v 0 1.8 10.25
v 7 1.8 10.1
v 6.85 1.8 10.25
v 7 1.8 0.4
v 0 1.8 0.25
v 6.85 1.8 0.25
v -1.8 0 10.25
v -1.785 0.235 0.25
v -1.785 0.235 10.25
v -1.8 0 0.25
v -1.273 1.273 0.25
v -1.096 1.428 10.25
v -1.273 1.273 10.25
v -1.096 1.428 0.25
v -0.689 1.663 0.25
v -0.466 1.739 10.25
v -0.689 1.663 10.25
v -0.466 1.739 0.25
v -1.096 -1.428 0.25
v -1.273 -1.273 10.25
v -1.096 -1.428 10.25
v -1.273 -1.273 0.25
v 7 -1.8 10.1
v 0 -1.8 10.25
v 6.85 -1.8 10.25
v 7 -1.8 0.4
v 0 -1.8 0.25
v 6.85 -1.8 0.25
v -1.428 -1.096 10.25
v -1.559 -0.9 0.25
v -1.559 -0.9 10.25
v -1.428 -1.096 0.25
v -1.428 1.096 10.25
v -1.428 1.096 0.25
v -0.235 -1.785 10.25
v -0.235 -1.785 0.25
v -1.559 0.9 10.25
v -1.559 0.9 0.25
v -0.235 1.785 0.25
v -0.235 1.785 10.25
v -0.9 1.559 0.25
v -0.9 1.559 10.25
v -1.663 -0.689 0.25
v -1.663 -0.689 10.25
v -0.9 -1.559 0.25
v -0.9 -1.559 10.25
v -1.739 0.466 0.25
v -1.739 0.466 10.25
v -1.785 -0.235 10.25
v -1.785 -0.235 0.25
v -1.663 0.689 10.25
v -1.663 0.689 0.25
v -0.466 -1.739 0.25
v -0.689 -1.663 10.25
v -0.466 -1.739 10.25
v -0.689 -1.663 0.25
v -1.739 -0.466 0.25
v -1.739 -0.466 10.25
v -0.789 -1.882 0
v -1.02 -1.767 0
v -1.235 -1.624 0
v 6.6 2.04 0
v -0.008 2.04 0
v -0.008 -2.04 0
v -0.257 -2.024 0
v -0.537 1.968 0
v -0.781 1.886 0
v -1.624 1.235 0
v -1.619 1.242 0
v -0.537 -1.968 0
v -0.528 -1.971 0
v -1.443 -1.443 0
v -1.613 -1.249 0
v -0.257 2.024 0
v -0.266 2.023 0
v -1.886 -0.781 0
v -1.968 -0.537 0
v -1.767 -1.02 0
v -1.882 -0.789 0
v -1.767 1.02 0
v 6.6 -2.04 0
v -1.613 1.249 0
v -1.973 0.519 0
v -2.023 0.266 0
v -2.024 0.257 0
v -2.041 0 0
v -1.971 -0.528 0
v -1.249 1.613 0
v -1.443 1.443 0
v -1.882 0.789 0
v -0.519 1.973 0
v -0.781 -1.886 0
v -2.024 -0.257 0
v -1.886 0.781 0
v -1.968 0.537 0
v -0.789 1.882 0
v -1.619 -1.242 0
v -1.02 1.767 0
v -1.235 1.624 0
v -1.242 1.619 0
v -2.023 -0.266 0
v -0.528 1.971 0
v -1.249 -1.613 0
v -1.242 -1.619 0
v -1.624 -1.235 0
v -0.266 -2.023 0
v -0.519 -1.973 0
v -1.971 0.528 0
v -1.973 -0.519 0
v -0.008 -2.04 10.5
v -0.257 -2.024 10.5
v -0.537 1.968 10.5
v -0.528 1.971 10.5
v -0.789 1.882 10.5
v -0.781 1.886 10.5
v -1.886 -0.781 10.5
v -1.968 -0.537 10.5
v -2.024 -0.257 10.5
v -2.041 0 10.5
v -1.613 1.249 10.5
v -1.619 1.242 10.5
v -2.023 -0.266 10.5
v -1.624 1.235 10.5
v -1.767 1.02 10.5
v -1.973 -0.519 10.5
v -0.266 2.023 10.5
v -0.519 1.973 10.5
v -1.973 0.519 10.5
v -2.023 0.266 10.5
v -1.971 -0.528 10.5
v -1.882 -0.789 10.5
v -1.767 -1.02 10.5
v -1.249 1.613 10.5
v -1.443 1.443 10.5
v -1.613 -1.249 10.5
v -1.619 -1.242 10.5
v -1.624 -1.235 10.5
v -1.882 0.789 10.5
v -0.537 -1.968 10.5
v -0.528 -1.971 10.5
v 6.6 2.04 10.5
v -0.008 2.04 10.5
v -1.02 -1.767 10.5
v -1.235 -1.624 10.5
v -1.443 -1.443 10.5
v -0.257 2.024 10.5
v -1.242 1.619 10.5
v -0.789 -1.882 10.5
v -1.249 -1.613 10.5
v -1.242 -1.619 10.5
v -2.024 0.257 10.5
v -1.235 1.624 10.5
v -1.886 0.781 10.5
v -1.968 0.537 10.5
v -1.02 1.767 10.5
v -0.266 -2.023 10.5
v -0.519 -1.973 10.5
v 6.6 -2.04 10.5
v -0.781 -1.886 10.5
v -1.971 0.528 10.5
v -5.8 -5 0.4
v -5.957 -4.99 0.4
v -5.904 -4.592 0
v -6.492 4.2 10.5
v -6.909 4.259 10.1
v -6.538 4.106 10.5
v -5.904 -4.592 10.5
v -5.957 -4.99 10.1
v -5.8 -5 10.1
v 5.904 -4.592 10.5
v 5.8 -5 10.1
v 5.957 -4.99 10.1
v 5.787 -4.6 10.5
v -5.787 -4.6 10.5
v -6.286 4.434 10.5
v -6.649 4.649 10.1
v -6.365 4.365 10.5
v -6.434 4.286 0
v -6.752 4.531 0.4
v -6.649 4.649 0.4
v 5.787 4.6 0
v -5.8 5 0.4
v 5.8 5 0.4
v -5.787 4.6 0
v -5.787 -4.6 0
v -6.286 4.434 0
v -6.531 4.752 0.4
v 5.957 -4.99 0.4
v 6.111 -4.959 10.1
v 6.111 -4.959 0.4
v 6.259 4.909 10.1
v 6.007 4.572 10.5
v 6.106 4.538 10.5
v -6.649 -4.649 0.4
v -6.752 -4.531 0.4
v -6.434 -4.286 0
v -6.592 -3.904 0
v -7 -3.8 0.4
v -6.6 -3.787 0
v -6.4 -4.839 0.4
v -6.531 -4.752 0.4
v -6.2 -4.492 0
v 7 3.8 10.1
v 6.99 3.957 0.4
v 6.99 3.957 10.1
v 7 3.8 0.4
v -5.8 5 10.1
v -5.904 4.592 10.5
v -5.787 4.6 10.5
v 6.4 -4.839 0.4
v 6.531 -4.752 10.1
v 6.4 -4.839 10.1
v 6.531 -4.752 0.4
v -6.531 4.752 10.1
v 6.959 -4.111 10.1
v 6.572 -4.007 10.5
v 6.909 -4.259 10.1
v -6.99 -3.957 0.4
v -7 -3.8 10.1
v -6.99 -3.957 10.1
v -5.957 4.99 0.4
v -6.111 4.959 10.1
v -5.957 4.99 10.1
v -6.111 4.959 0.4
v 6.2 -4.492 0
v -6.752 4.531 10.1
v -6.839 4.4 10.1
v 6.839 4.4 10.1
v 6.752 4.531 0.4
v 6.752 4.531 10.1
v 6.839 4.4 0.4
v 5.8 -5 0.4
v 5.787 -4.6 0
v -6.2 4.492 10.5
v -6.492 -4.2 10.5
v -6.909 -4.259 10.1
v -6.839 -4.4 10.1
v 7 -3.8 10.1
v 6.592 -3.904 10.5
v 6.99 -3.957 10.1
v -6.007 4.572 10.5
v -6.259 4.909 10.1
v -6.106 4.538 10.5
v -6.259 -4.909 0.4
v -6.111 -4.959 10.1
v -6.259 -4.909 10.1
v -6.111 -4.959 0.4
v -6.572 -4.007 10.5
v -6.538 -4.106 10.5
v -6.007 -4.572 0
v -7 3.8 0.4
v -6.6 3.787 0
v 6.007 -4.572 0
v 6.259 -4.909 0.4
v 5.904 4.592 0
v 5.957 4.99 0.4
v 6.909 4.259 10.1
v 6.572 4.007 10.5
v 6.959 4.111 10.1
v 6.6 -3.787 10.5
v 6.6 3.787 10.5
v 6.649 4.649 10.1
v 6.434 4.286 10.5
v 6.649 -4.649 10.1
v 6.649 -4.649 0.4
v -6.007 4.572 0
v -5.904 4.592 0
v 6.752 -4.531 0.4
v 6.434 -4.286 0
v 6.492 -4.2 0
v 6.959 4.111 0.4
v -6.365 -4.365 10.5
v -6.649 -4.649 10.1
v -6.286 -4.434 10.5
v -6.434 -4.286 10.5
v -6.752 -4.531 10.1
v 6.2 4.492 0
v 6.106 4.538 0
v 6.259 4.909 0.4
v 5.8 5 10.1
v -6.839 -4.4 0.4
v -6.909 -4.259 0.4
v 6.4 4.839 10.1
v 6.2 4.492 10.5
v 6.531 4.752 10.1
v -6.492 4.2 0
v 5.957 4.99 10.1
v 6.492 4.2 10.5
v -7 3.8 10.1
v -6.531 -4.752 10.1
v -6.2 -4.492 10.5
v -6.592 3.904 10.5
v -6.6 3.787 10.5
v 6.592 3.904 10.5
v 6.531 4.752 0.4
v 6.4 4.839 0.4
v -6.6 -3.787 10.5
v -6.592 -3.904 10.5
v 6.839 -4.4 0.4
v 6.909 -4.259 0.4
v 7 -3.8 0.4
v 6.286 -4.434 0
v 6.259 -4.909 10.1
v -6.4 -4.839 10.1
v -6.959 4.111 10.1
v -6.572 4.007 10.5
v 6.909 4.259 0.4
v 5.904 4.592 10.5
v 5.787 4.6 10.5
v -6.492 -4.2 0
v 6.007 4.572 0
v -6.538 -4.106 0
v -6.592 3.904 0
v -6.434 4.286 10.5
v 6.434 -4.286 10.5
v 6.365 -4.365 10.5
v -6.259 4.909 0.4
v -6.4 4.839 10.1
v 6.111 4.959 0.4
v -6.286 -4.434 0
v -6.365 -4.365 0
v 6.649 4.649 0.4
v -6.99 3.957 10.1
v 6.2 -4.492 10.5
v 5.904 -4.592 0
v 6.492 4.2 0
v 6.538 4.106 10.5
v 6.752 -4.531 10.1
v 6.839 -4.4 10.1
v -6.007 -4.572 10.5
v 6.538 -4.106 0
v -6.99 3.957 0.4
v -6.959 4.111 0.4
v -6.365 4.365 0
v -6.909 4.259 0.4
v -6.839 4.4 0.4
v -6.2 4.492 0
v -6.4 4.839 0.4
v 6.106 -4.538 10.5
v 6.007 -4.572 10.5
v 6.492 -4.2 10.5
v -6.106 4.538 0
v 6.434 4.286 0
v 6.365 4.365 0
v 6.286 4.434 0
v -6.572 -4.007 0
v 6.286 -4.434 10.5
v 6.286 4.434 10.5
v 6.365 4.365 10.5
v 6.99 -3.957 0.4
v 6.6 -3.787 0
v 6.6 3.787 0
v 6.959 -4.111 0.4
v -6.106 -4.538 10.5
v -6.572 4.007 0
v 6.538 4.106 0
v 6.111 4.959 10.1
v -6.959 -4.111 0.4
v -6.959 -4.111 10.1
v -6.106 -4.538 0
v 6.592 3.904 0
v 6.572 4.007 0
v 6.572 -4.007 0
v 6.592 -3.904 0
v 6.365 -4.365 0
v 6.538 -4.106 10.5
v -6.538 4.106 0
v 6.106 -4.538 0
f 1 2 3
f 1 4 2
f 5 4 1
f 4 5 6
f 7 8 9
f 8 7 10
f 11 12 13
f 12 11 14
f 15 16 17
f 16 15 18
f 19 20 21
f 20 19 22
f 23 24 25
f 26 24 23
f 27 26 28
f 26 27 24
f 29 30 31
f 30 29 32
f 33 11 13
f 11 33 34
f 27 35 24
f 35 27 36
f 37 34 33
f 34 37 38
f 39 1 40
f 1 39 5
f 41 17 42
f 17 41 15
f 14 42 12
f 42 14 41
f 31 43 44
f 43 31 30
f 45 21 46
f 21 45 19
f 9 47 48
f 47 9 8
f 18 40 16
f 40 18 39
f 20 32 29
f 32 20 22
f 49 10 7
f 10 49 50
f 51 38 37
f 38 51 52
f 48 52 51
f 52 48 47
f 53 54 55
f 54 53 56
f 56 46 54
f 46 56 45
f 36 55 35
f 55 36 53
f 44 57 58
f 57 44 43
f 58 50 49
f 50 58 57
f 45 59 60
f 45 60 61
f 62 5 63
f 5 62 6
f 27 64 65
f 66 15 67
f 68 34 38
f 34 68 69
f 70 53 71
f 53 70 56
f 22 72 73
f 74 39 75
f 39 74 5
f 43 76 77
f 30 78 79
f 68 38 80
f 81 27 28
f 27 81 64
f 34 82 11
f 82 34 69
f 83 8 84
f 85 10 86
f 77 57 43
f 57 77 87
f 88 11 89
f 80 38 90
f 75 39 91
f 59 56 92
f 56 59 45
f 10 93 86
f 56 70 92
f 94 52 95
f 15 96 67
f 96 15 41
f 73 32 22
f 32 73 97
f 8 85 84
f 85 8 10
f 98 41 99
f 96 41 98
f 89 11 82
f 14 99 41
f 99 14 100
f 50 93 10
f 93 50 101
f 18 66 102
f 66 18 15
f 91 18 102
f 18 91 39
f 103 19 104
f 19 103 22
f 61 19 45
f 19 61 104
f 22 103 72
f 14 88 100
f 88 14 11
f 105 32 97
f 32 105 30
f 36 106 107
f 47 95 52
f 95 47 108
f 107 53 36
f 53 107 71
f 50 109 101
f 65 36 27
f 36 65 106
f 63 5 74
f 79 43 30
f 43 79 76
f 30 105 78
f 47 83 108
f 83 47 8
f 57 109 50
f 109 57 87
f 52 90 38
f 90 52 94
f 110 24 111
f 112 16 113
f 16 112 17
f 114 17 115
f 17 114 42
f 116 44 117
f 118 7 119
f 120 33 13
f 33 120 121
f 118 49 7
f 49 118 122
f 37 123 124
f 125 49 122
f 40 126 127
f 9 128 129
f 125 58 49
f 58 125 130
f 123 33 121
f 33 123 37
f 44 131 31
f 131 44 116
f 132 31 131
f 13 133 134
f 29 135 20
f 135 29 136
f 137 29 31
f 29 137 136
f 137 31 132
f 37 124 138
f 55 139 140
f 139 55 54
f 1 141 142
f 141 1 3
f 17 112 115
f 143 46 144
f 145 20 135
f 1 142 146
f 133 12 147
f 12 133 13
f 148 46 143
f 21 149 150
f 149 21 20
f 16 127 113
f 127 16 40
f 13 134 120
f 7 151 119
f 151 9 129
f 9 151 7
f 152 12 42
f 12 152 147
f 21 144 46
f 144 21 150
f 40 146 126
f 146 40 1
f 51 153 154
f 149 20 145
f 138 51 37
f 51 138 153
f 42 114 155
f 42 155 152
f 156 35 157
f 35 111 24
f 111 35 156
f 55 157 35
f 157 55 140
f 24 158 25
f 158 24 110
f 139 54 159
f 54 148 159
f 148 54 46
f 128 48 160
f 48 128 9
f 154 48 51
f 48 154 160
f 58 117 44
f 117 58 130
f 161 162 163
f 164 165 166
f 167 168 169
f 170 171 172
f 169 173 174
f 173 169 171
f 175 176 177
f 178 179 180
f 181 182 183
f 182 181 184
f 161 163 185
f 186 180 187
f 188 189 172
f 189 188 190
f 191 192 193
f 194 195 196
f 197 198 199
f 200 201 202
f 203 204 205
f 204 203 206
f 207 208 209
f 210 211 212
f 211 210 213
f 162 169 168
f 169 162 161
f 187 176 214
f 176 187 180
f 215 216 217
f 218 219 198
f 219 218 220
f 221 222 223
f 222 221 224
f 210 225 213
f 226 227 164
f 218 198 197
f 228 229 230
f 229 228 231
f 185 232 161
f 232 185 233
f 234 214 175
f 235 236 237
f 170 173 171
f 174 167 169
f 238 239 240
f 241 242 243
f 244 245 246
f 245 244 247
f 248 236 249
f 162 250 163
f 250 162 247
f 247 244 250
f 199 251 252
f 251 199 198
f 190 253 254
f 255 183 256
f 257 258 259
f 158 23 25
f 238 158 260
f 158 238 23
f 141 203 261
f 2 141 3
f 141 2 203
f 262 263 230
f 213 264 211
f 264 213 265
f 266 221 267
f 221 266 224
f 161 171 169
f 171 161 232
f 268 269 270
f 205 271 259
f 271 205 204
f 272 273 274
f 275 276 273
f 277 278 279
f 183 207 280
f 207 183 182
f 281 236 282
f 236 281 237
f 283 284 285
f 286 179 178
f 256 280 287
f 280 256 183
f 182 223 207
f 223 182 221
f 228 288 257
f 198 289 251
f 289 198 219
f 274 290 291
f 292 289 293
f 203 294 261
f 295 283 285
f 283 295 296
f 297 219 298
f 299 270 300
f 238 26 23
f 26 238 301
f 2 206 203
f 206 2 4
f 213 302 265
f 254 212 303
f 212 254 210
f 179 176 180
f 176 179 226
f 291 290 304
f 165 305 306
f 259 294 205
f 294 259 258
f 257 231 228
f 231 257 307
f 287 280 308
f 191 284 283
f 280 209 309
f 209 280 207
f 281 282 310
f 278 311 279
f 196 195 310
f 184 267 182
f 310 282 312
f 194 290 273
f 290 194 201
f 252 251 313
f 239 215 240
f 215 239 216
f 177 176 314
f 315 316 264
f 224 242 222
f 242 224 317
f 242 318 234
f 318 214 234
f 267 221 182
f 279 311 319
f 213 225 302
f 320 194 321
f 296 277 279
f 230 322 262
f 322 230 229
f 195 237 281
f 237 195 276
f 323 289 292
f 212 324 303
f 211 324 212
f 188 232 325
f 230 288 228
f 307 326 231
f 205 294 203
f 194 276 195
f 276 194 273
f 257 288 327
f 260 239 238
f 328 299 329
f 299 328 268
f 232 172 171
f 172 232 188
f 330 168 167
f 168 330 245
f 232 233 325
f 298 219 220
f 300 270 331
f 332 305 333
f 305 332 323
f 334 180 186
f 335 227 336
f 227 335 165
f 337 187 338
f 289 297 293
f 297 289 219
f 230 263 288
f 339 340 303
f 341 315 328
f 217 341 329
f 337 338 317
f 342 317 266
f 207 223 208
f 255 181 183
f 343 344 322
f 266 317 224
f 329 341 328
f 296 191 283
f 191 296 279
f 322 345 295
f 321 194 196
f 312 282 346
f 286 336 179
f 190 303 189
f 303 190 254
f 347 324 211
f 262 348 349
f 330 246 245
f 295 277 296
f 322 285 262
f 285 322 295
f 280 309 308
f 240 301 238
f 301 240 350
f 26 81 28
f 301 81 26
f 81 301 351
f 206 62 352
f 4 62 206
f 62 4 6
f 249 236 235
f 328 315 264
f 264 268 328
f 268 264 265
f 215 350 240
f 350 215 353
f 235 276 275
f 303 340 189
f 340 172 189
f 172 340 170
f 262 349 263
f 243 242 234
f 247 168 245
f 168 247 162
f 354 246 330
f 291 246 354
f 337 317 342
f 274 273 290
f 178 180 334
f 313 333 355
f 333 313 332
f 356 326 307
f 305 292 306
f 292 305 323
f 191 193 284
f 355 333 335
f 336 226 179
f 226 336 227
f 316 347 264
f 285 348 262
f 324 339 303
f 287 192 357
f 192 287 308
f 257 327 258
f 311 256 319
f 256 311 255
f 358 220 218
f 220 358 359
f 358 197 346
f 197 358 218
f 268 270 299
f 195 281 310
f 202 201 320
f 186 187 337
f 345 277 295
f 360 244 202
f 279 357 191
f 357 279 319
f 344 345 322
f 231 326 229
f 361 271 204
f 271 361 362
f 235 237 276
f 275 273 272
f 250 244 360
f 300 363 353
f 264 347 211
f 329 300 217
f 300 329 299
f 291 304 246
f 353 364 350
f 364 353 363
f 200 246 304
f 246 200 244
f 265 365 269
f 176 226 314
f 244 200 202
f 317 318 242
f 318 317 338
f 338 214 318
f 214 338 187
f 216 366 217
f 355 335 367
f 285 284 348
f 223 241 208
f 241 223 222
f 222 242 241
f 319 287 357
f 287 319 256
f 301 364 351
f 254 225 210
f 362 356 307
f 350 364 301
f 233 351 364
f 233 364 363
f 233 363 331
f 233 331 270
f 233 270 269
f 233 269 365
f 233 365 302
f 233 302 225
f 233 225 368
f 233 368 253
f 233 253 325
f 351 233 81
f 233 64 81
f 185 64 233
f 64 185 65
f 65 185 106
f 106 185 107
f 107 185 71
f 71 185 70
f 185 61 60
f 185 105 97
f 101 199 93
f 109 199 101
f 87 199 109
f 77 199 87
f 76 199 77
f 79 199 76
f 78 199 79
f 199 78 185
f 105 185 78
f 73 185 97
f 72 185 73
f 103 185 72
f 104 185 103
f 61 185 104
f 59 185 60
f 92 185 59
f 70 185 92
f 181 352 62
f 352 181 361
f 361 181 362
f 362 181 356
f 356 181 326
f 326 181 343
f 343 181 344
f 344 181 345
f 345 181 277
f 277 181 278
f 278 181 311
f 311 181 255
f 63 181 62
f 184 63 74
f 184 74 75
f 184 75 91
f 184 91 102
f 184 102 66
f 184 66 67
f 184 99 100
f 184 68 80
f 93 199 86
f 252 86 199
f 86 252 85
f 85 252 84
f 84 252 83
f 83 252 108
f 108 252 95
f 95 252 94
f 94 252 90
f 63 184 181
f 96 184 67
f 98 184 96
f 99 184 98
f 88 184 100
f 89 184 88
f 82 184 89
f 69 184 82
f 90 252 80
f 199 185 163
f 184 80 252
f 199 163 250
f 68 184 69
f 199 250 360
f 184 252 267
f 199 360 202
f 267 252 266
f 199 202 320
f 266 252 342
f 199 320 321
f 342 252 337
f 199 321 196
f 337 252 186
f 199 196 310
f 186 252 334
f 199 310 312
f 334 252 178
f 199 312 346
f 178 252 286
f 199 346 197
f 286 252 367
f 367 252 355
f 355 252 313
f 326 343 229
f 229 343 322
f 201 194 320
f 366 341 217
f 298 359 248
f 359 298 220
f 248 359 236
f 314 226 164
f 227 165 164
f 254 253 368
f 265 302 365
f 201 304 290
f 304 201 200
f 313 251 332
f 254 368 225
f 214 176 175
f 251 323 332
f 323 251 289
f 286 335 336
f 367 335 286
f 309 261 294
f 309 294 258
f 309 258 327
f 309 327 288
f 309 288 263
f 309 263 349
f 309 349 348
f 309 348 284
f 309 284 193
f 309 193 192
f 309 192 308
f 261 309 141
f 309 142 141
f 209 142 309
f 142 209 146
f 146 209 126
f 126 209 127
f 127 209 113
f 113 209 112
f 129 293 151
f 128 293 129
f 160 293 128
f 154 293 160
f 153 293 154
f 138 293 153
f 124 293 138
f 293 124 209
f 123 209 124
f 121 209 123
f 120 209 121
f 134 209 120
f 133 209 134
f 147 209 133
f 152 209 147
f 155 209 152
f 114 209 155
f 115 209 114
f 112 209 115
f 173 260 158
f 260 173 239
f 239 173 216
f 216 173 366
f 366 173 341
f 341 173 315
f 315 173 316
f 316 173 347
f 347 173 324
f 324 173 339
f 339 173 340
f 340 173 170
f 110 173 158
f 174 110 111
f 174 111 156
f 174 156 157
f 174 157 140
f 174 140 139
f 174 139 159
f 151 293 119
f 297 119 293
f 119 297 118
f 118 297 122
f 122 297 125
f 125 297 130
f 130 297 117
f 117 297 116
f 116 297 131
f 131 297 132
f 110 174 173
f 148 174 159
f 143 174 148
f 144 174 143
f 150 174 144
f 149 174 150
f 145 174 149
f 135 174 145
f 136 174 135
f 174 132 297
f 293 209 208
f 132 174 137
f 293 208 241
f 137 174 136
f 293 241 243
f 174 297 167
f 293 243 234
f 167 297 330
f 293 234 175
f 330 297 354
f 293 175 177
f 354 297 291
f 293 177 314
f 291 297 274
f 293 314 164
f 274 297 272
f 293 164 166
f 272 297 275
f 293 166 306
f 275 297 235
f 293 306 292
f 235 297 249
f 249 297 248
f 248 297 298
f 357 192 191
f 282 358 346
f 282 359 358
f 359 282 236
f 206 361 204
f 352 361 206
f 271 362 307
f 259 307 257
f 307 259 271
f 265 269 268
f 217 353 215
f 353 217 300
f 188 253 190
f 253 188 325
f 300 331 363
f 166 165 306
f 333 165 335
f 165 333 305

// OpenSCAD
// file: ../../../../../scad/lib/edge_finished_profiles.scad
// Local positive primitives are finished before functional cuts.
use <util.scad>
module ef_round_rect(w,l,r) {
    safe_r=min(r,w/2-0.01,l/2-0.01);
    translate([-w/2,-l/2]) projection(cut=true) rrect_prism(w,l,1,safe_r);
}
module ef_capsule(w,l) {
    assert(l>=w && w>0);
    hull() for(s=[-1,1]) translate([0,s*(l-w)/2]) circle(d=w,$fn=48);
}
module ef_profile(t,c=0.6) {
    // Compensated local profile, exact extrema and thickness. This is not a
    // blanket Minkowski of a completed part or assembly. Cuts are restored last.
    assert(t>2*c && c>0);
    minkowski() {
        translate([0,0,c]) linear_extrude(t-2*c) offset(delta=-c) children();
        union() {
            translate([0,0,-c]) cylinder(r1=0,r2=c,h=c,$fn=16);
            cylinder(r1=c,r2=0,h=c,$fn=16);
        }
    }
}
module ef_convex_profile(t,c=0.6) {
    // Exact offset loft for convex profiles: avoids unnecessary 3D Minkowski
    // triangulation on large plates and bosses. Nonconvex profiles use ef_profile.
    assert(t>2*c && c>0);
    hull() {
        linear_extrude(0.01) offset(delta=-c) children();
        translate([0,0,c]) linear_extrude(t-2*c) children();
        translate([0,0,t-0.01]) linear_extrude(0.01) offset(delta=-c) children();
    }
}
module ef_cut(t,c=0.6) {
    translate([0,0,-0.1]) linear_extrude(t+0.2) children();
    hull() {
        translate([0,0,-0.01]) linear_extrude(0.01) offset(delta=c) children();
        translate([0,0,c]) linear_extrude(0.01) children();
    }
    hull() {
        translate([0,0,t-c-0.01]) linear_extrude(0.01) children();
        translate([0,0,t]) linear_extrude(0.01) offset(delta=c) children();
    }
}
module ef_bore(d,t,c=0.3) { ef_cut(t,c) circle(d=d,$fn=32); }
// Diameter is the inscribed circle: polygon flats preserve the shaft clearance.
module ef_poly_bore(d,t,c=0.3,sides=8) {
    assert(sides>=6 && sides==floor(sides));
    ef_cut(t,c) rotate(180/sides) circle(r=d/2/cos(180/sides),$fn=sides);
}
module ef_box(w,l,t,r=2,c=0.6) { ef_convex_profile(t,c) ef_round_rect(w,l,r); }
module ef_hex(af) { rotate(30) circle(d=af/cos(30),$fn=6); }
module ef_plan_finish(r=2) {
    // Closing rounds concave roots; opening rounds convex corners. Exact planar
    // extrema and straight functional flats are retained.
    offset(r=r) offset(delta=-r) offset(delta=-r) offset(r=r) children();
}
module ef_root(w,l,r=1,corner=2) {
    // Local 45-degree relief where a boss meets a plate (place at plate top).
    hull() {
        linear_extrude(0.01) ef_round_rect(w+2*r,l+2*r,corner+r);
        // End strictly inside the boss. An exact tangent match of the two
        // independently tessellated rounded profiles creates microscopic lips.
        translate([0,0,r+0.3]) linear_extrude(0.01)
            offset(delta=-0.3) ef_round_rect(w,l,corner);
    }
}
// file: ../../../../../scad/lib/camera_rotary_joint.scad
// Camera-only rotary joint, mm. Legacy light quick-release remains untouched.
// Female assembled face z=18.5; male face z=6. Male is flipped onto female.
use <../../parts/common/jigs/quick_release_prototypes/quick_release_prototypes.scad>
use <edge_finished_profiles.scad>
$fn=48;
camera_qr_ear_center=52;
camera_qr_ear_width=10;
camera_qr_ear_inner=12;
camera_qr_ear_end=57;
camera_qr_ear_chamfer=.4;
camera_qr_screw_clearance=3.5;
camera_qr_nut_af=5.8;
camera_qr_nut_bottom=2;
camera_qr_nut_top=4.8;
camera_qr_screw_bottom=.5;
module camera_qr_ear(z,h,s) {
 translate([0,s*(camera_qr_ear_inner+camera_qr_ear_end)/2,z])
  ef_box(camera_qr_ear_width,camera_qr_ear_end-camera_qr_ear_inner,h,2,camera_qr_ear_chamfer);
}
// Round concave joins of the ears to the existing pad. The inner exclusion
// protects mating surfaces. 0.1 mm overlap avoids coincident boolean faces.
module camera_qr_roots(foot_width,z,h,round_foot=false) {
 difference() {
  translate([0,0,z]) ef_profile(h,.3) ef_plan_finish(1) union() {
   if(round_foot) circle(d=foot_width,$fn=64);
   else ef_round_rect(foot_width,foot_width,3);
   for(s=[-1,1])
    translate([0,s*(camera_qr_ear_inner+camera_qr_ear_end)/2])
     ef_round_rect(camera_qr_ear_width,camera_qr_ear_end-camera_qr_ear_inner,2);
  }
  translate([0,0,z-.1]) linear_extrude(h+.2)
   if(round_foot) circle(d=foot_width-.2,$fn=64);
   else ef_round_rect(foot_width-.2,foot_width-.2,2.9);
 }
}
module camera_qr_female_cuts() {
 for(s=[-1,1]) {
  translate([0,s*camera_qr_ear_center,camera_qr_screw_bottom])
   ef_poly_bore(camera_qr_screw_clearance,8-camera_qr_screw_bottom+.02,.25,8);
  // Allow a fully unthreaded shank to slide outward; retain hex shoulders.
  translate([0,0,4.92]) ef_cut(3.2,.15) hull() {
   translate([0,s*camera_qr_ear_center]) circle(d=3.6,$fn=48);
   translate([0,s*(camera_qr_ear_end+1)]) circle(d=3.6,$fn=48);
  }
  translate([0,s*camera_qr_ear_center,camera_qr_nut_bottom+.1])
   ef_cut(camera_qr_nut_top-camera_qr_nut_bottom-.2,.2)
    hull() {
     ef_hex(camera_qr_nut_af);
     translate([0,s*7]) square([camera_qr_nut_af,1],center=true);
    }
 }
}
module camera_qr_female() {
 difference() {
  union() {
   twist_female();
   for(s=[-1,1]) camera_qr_ear(0,8,s);
   camera_qr_roots(28,0,8,true);
   // Raise the annular land 0.5 mm to preserve the existing z=24.5
   // camera datum. Entry slots must remain open through the raised land.
   difference() {
    translate([0,0,17.98]) cylinder(d=28,h=.52);
    translate([0,0,17.97]) cylinder(d=14.6,h=.55);
    for(a=[80,260]) rotate([0,0,a])
     translate([0,-3.3,17.97]) cube([10.8,6.6,.55]);
   }
  }
  camera_qr_female_cuts();
 }
}
module camera_qr_male() {
 difference() {
  union() {
   twist_male();
   camera_qr_roots(40,0,6);
   camera_qr_roots(60,-6,6);
   for(s=[-1,1]) {
    camera_qr_ear(-6,12,s);
    // Fill old rubber recesses; rigid lands carry the clamping force.
    translate([s*10.5,0,5.7]) cube([5.5,8.5,.6],center=true);
   }
  }
  for(s=[-1,1]) translate([0,0,-6.01])
   ef_cut(12.02,.25) hull() {
    translate([0,s*camera_qr_ear_center]) circle(d=3.6,$fn=48);
    translate([0,s*(camera_qr_ear_end+1)]) circle(d=3.6,$fn=48);
   }
  // Clearance beneath lug bearing faces permits the rigid faces to close:
  // legacy nominal gap 0.5 mm plus 0.3 mm clearance; preserve 2.2 mm lug.
  difference() {
   translate([0,0,10.99]) cylinder(d=24,h=.81);
   translate([0,0,10.98]) cylinder(d=14,h=.85);
  }
 }
}

// Removable slotted spacer; open slot faces +X for both sides.
module camera_qr_spacer() {
 difference() {
  ef_box(14,10,10.5,1.2,.4);
  translate([0,0,-.01]) ef_cut(10.52,.25)
   hull() { circle(d=3.6,$fn=48); translate([8,0]) circle(d=3.6,$fn=48); }
 }
}
// main file
use <../../../../../scad/lib/camera_rotary_joint.scad>
camera_qr_spacer();
